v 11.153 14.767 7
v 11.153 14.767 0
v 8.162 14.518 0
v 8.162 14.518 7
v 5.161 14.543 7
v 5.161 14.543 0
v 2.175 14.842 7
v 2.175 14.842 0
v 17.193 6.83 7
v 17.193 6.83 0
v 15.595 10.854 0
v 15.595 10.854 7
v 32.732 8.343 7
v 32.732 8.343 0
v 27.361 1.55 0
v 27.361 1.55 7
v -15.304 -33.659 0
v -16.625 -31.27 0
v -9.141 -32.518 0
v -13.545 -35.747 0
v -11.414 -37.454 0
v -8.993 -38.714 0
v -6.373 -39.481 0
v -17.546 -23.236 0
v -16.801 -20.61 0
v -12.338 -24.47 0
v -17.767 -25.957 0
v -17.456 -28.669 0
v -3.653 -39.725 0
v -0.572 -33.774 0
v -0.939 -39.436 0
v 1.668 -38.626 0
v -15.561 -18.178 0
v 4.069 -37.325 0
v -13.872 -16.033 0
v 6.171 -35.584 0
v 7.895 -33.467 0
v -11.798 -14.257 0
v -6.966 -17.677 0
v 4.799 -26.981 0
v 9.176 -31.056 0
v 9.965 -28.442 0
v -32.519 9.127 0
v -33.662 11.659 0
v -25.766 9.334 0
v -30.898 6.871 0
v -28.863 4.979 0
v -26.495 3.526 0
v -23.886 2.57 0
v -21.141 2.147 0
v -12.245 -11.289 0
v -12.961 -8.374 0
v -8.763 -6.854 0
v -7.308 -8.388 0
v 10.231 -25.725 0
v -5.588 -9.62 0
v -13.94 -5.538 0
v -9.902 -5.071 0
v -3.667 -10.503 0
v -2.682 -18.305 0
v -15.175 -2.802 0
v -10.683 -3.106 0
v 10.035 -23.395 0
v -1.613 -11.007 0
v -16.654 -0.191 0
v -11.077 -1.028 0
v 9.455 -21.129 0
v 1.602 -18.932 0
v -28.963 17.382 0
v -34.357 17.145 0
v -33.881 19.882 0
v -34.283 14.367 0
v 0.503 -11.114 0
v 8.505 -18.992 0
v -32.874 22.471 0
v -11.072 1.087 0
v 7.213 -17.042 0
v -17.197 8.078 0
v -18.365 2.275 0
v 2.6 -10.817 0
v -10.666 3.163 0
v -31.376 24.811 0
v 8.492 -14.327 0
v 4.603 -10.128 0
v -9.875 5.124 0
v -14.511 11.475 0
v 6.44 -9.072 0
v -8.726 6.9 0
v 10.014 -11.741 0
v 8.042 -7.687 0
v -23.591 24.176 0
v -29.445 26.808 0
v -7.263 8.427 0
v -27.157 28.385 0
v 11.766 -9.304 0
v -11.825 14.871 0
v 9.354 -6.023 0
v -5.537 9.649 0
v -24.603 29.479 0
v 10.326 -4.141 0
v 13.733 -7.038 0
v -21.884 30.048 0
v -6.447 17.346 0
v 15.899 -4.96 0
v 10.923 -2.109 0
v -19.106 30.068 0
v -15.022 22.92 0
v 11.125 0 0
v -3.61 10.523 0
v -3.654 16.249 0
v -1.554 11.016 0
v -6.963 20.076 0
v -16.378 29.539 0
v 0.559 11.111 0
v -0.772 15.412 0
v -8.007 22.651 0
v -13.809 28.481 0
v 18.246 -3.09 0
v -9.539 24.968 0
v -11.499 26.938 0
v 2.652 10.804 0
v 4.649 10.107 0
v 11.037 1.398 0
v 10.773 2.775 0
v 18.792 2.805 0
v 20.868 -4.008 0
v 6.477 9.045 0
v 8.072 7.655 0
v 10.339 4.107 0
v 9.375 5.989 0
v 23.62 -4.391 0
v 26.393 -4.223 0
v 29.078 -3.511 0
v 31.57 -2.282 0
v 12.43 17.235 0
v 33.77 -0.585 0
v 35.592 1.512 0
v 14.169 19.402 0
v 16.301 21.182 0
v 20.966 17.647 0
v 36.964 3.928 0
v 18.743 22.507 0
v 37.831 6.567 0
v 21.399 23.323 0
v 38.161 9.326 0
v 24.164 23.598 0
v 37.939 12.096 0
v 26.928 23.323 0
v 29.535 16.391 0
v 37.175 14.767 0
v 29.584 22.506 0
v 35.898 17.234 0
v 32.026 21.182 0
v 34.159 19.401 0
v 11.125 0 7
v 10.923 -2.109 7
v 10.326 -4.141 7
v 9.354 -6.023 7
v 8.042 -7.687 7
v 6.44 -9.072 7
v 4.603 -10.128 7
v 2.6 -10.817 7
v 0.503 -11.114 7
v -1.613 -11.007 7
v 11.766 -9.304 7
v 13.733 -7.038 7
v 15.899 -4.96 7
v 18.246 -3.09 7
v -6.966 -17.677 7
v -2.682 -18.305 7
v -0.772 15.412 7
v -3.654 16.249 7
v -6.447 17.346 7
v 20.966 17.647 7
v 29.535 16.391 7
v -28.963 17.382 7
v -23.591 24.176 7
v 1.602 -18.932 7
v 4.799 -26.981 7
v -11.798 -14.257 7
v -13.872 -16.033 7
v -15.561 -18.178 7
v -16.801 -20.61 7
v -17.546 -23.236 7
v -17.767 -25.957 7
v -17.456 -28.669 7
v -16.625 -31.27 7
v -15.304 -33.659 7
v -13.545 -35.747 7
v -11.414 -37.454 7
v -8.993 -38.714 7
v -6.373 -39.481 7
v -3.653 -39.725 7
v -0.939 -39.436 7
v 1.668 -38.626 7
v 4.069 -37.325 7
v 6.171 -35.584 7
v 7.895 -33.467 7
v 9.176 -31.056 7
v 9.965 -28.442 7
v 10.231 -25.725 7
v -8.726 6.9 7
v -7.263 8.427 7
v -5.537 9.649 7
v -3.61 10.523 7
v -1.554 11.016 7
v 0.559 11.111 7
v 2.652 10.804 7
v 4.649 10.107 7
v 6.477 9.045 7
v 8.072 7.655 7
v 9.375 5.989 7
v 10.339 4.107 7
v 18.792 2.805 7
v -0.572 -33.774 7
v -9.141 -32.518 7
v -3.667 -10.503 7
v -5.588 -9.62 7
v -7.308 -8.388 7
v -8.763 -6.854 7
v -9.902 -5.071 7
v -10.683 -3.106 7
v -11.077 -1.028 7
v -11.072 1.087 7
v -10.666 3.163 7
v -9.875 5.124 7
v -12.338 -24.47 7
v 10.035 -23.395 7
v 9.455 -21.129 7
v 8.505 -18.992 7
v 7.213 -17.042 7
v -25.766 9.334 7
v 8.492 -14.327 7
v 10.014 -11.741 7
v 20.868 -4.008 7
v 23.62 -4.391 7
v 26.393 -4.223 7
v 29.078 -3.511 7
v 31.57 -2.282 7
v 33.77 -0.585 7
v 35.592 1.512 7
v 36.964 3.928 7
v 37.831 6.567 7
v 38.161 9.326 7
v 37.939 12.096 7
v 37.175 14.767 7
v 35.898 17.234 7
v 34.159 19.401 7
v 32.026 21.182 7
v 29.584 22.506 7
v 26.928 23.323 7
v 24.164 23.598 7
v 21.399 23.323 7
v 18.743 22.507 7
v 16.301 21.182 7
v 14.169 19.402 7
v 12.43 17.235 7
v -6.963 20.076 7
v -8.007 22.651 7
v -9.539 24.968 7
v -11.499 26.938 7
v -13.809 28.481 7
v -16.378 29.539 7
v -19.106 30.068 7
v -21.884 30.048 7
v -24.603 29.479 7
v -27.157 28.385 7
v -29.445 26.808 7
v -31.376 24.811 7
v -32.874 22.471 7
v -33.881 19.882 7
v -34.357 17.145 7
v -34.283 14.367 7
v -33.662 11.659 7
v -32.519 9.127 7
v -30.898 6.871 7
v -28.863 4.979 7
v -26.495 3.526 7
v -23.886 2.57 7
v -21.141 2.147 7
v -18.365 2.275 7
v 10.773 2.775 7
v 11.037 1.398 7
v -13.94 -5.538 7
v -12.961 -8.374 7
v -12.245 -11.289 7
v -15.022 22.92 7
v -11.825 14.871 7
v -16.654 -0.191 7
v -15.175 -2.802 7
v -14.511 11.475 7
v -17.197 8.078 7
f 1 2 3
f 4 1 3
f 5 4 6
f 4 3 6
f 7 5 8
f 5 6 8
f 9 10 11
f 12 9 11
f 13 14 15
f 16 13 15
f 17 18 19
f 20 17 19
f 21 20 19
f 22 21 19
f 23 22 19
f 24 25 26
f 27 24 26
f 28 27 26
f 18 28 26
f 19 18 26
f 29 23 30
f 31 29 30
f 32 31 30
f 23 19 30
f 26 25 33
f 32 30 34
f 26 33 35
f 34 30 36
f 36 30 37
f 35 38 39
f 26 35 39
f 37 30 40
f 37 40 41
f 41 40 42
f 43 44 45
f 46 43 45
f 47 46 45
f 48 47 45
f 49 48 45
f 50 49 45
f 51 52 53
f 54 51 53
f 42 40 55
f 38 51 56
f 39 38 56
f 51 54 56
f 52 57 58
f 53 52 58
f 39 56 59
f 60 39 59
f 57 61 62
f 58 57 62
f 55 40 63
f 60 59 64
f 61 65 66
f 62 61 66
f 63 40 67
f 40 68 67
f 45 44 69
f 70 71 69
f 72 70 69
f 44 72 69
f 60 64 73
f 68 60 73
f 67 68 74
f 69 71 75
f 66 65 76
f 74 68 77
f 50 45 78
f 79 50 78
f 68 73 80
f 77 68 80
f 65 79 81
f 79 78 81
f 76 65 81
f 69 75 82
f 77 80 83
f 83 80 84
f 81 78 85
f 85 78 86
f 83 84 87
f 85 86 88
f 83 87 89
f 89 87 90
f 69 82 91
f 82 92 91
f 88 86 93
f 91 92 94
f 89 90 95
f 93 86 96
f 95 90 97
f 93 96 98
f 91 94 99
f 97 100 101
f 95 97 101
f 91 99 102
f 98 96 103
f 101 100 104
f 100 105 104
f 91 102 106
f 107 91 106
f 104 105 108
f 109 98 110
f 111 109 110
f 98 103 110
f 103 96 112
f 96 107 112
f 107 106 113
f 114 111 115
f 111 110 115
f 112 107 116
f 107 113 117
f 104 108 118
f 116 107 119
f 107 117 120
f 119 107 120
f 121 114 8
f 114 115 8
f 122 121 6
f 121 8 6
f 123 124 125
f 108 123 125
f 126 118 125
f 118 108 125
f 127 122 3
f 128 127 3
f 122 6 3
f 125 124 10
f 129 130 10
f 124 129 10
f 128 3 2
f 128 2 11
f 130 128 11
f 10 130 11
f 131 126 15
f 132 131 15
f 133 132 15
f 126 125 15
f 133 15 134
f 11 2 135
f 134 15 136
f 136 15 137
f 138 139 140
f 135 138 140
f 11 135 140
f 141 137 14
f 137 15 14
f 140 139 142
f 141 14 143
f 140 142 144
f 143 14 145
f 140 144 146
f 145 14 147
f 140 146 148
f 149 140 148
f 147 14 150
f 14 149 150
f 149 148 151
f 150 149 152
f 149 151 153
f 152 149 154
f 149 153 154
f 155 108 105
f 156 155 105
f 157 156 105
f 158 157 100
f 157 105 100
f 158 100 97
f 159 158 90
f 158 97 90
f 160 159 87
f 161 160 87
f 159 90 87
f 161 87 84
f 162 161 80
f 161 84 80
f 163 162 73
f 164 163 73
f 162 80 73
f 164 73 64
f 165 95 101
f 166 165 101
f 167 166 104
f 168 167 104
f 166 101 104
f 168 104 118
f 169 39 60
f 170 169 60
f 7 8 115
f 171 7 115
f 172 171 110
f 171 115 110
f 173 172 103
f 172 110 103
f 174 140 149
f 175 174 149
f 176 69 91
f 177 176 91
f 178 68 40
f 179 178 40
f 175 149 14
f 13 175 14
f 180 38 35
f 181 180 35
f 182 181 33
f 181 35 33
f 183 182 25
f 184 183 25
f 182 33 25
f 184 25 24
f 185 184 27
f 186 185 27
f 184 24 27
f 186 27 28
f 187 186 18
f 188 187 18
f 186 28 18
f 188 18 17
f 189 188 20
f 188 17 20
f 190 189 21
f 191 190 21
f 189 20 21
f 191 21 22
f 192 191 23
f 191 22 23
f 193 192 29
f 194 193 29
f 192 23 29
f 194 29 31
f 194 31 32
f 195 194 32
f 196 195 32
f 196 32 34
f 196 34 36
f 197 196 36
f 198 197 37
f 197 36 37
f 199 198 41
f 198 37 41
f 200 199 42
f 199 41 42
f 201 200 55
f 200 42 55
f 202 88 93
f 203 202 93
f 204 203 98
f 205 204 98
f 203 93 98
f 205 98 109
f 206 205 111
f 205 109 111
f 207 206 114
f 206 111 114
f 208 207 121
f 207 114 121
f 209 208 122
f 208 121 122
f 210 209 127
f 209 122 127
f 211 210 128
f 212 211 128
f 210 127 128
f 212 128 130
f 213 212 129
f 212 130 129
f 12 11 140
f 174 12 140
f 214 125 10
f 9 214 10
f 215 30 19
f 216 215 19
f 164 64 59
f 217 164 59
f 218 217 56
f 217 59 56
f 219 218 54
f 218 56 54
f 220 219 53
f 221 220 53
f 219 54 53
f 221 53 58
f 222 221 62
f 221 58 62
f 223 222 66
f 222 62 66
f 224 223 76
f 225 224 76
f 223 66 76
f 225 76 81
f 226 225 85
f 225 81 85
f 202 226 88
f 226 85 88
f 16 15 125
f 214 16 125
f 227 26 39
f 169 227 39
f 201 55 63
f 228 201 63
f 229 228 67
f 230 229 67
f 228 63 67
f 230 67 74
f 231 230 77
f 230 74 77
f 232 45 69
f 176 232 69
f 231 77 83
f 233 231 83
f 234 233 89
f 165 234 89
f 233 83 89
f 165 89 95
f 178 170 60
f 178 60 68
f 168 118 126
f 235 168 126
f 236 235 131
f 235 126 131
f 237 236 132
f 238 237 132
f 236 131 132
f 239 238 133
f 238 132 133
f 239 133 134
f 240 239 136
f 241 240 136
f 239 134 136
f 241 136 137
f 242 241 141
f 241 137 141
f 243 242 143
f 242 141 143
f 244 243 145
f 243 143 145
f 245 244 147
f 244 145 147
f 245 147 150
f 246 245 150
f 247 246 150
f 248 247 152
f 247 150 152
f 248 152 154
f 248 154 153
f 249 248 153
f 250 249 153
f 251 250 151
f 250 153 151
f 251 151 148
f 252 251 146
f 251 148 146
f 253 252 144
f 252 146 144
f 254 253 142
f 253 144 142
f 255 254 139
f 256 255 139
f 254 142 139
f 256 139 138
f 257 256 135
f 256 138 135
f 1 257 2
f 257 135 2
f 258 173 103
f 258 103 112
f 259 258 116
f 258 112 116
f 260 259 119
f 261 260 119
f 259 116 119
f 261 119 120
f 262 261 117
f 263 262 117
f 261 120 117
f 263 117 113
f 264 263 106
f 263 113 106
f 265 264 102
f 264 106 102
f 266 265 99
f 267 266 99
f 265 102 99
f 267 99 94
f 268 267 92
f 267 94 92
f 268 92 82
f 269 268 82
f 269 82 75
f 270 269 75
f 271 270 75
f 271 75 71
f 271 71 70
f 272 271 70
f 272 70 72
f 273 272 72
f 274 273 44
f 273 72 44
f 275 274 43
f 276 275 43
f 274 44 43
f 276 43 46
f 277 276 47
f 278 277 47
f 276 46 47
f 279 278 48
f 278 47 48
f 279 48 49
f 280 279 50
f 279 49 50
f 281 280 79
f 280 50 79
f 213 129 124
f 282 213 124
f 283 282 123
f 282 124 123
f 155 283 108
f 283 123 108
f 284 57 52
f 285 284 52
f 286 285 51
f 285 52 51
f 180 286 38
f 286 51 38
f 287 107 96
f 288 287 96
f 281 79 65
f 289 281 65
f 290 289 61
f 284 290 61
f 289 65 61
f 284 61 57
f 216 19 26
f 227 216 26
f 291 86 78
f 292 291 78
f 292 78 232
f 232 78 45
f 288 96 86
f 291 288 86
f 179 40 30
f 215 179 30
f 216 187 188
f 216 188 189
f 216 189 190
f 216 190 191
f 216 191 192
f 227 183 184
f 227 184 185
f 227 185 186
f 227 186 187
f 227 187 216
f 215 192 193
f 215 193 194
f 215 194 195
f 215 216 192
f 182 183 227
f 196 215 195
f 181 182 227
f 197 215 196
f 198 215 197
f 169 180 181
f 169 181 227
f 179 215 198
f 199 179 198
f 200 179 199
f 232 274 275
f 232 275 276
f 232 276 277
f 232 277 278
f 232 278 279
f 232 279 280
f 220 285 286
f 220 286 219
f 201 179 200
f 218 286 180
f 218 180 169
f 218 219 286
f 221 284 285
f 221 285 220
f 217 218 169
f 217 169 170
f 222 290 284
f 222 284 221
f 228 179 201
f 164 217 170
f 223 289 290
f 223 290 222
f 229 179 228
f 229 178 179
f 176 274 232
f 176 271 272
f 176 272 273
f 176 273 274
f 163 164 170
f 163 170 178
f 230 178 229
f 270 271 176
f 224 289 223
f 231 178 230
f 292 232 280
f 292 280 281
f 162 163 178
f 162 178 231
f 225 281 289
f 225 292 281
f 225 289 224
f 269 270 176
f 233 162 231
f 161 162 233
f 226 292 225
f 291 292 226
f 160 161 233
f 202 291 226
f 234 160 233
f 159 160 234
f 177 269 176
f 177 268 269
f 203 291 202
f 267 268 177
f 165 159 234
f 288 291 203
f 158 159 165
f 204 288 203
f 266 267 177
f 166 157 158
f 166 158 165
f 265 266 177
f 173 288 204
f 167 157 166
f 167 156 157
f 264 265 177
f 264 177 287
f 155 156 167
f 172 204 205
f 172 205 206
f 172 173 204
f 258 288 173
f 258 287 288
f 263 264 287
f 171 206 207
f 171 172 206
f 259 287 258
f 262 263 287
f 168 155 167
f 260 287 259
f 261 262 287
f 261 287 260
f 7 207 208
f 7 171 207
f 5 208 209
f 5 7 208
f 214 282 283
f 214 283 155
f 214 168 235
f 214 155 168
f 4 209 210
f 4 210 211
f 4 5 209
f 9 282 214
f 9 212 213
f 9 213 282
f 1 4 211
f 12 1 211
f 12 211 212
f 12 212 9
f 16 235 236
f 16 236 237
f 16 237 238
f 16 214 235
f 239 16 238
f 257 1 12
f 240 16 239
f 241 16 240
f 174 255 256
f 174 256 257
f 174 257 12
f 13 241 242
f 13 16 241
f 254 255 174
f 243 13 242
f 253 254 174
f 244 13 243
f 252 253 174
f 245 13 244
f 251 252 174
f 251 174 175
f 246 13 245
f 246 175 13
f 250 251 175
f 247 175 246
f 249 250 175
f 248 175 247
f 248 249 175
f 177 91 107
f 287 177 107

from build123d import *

# Parameters (mm, degrees)
F1_DEPTH = 7


with BuildPart() as f1:
    # F0 (on Top) → F1 (new body)
    with BuildSketch(Plane.XY):
        with BuildLine():
            ThreePointArc((2.1746022478, 14.8415331103), (6.4977862425, 13.5195700356), (10.2307544738, 10.9695789753))
            ThreePointArc((10.2307544738, 10.9695789753), (10.5585141702, 12.900767483), (11.1526052364, 14.7673074037))
            ThreePointArc((11.1526052364, 14.7673074037), (6.6610534474, 14.4959482424), (2.1746022478, 14.8415331103))
        make_face()
        with BuildLine():
            ThreePointArc((-6.6537135081, 13.4435150371), (-2.3461080653, 14.8153898682), (2.1746022478, 14.8415331103))
            ThreePointArc((2.1746022478, 14.8415331103), (-2.222405254, 15.7975651559), (-6.4473076734, 17.3460714654))
            ThreePointArc((-6.4473076734, 17.3460714654), (-6.4074297998, 16.7371058402), (-6.3941287506, 16.1269808862))
            ThreePointArc((-6.3941287506, 16.1269808862), (-6.4591760525, 14.7789848542), (-6.6537135081, 13.4435150371))
        make_face()
        with BuildLine():
            ThreePointArc((-14.6153112984, 3.3753037866), (-16.4516494537, 2.6935577561), (-18.3651659754, 2.2747857513))
            ThreePointArc((-18.3651659754, 2.2747857513), (-15.8843861596, -1.4793326091), (-13.9404458375, -5.5375057427))
            ThreePointArc((-13.9404458375, -5.5375057427), (-14.9571842212, -1.1325370512), (-14.6153112984, 3.3753037866))
        make_face()
        with BuildLine():
            ThreePointArc((-11.7984847082, -14.2565679638), (-10.1191795776, -13.2481782826), (-8.3155687842, -12.484042446))
            ThreePointArc((-8.3155687842, -12.484042446), (-11.6574499679, -9.4394841091), (-13.9404458375, -5.5375057427))
            ThreePointArc((-13.9404458375, -5.5375057427), (-12.5698901189, -9.8234419736), (-11.7984847082, -14.2565679638))
        make_face()
        with BuildLine():
            ThreePointArc((7.2125607389, -17.042093155), (9.2233325136, -13.0166159499), (11.7658431097, -9.3040279405))
            ThreePointArc((11.7658431097, -9.3040279405), (8.4593976642, -12.3870331863), (4.3845568245, -14.3448827619))
            ThreePointArc((4.3845568245, -14.3448827619), (5.8931352835, -15.5943252391), (7.2125607389, -17.042093155))
        make_face()
        with BuildLine():
            ThreePointArc((18.2457923815, -3.0895035015), (16.5328487354, -2.1393774383), (14.9692822923, -0.959472591))
            ThreePointArc((14.9692822923, -0.959472591), (14.0035578894, -5.375906104), (11.7658431097, -9.3040279405))
            ThreePointArc((11.7658431097, -9.3040279405), (14.792295096, -5.9741234333), (18.2457923815, -3.0895035015))
        make_face()
        with BuildLine():
            ThreePointArc((-15.0224460068, 22.9199938039), (-10.9533439645, 19.7969343363), (-6.4473076734, 17.3460714654))
            ThreePointArc((-6.4473076734, 17.3460714654), (-31.3755826932, 24.8107398249), (-18.3651659754, 2.2747857513))
            ThreePointArc((-18.3651659754, 2.2747857513), (-21.7888075854, 6.0944414943), (-25.7658114944, 9.3339679685))
            Line((-25.7658114944, 9.3339679685), (-28.9628918775, 17.3824881445))
            Line((-28.9628918775, 17.3824881445), (-23.5912091337, 24.1755010623))
            Line((-23.5912091337, 24.1755010623), (-15.0224460068, 22.9199938039))
        make_face()
        with BuildLine():
            ThreePointArc((27.3605198922, 1.5498229669), (22.6213200346, -0.4125930385), (18.2457923815, -3.0895035015))
            ThreePointArc((18.2457923815, -3.0895035015), (31.6851726942, -2.2094309865), (38.1634395091, 9.598343143))
            ThreePointArc((38.1634395091, 9.598343143), (26.7948193926, 23.348828222), (11.1526052364, 14.7673074037))
            ThreePointArc((11.1526052364, 14.7673074037), (16.1723449486, 15.82244014), (20.966359126, 17.646863319))
            Line((20.966359126, 17.646863319), (29.5351222529, 16.3913560607))
            Line((29.5351222529, 16.3913560607), (32.732202636, 8.3428358846))
            Line((32.732202636, 8.3428358846), (27.3605198922, 1.5498229669))
        make_face()
        with BuildLine():
            ThreePointArc((10.2306892415, -25.7253240292), (9.454648576, -21.1289233158), (7.2125607389, -17.042093155))
            ThreePointArc((7.2125607389, -17.042093155), (5.6164626368, -21.9168816343), (4.7994523683, -26.9808312875))
            Line((4.7994523683, -26.9808312875), (-0.5722303754, -33.7738442052))
            Line((-0.5722303754, -33.7738442052), (-9.1409935023, -32.5183369469))
            Line((-9.1409935023, -32.5183369469), (-12.3380738854, -24.4698167708))
            ThreePointArc((-12.3380738854, -24.4698167708), (-11.6679760701, -19.3843412978), (-11.7984847082, -14.2565679638))
            ThreePointArc((-11.7984847082, -14.2565679638), (-10.2342765243, -38.1432231127), (10.2306892415, -25.7253240292))
        make_face()
        with BuildLine():
            ThreePointArc((13.9404458706, 5.5375056594), (14.7327303657, 2.818981371), (15, 0))
            ThreePointArc((15, 0), (14.9923186063, -0.4799820909), (14.9692822923, -0.959472591))
            ThreePointArc((14.9692822923, -0.959472591), (16.5328487354, -2.1393774383), (18.2457923815, -3.0895035015))
            ThreePointArc((18.2457923815, -3.0895035015), (22.6213200346, -0.4125930385), (27.3605198922, 1.5498229669))
            Line((27.3605198922, 1.5498229669), (18.7917567653, 2.8053302252))
            Line((18.7917567653, 2.8053302252), (17.1932165738, 6.8295903133))
            Line((17.1932165738, 6.8295903133), (13.9404458706, 5.5375056594))
        make_face()
        with BuildLine():
            ThreePointArc((10.2307544738, 10.9695789753), (12.3870330043, 8.4593979307), (13.9404458706, 5.5375056594))
            Line((13.9404458706, 5.5375056594), (17.1932165738, 6.8295903133))
            Line((17.1932165738, 6.8295903133), (15.5946763822, 10.8538504013))
            Line((15.5946763822, 10.8538504013), (20.966359126, 17.646863319))
            ThreePointArc((20.966359126, 17.646863319), (16.1723449486, 15.82244014), (11.1526052364, 14.7673074037))
            ThreePointArc((11.1526052364, 14.7673074037), (10.5585141702, 12.900767483), (10.2307544738, 10.9695789753))
        make_face()
        with BuildLine():
            ThreePointArc((-11.76584351, 9.3040274344), (-9.4394840743, 11.6574499961), (-6.6537135081, 13.4435150371))
            ThreePointArc((-6.6537135081, 13.4435150371), (-6.4591760525, 14.7789848542), (-6.3941287506, 16.1269808862))
            ThreePointArc((-6.3941287506, 16.1269808862), (-6.4074297998, 16.7371058402), (-6.4473076734, 17.3460714654))
            ThreePointArc((-6.4473076734, 17.3460714654), (-10.9533439645, 19.7969343363), (-15.0224460068, 22.9199938039))
            Line((-15.0224460068, 22.9199938039), (-11.8253656237, 14.8714736279))
            Line((-11.8253656237, 14.8714736279), (-14.5112069956, 11.474967169))
            Line((-14.5112069956, 11.474967169), (-11.76584351, 9.3040274344))
        make_face()
        with BuildLine():
            ThreePointArc((-14.6153112984, 3.3753037866), (-13.5195700109, 6.4977862939), (-11.76584351, 9.3040274344))
            Line((-11.76584351, 9.3040274344), (-14.5112069956, 11.474967169))
            Line((-14.5112069956, 11.474967169), (-17.1970483675, 8.0784607102))
            Line((-17.1970483675, 8.0784607102), (-25.7658114944, 9.3339679685))
            ThreePointArc((-25.7658114944, 9.3339679685), (-21.7888075854, 6.0944414943), (-18.3651659754, 2.2747857513))
            ThreePointArc((-18.3651659754, 2.2747857513), (-16.4516494537, 2.6935577561), (-14.6153112984, 3.3753037866))
        make_face()
        with BuildLine():
            Line((-2.6820095782, -18.3045574823), (-2.1746023607, -14.8415330938))
            ThreePointArc((-2.1746023607, -14.8415330938), (-5.3759058028, -14.003558005), (-8.3155687842, -12.484042446))
            ThreePointArc((-8.3155687842, -12.484042446), (-10.1191795776, -13.2481782826), (-11.7984847082, -14.2565679638))
            ThreePointArc((-11.7984847082, -14.2565679638), (-11.6679760701, -19.3843412978), (-12.3380738854, -24.4698167708))
            Line((-12.3380738854, -24.4698167708), (-6.9663911416, -17.6768038531))
            Line((-6.9663911416, -17.6768038531), (-2.6820095782, -18.3045574823))
        make_face()
        with BuildLine():
            ThreePointArc((7.2125607389, -17.042093155), (5.8931352835, -15.5943252391), (4.3845568245, -14.3448827619))
            ThreePointArc((4.3845568245, -14.3448827619), (1.1325370065, -14.9571842246), (-2.1746023607, -14.8415330938))
            Line((-2.1746023607, -14.8415330938), (-2.6820095782, -18.3045574823))
            Line((-2.6820095782, -18.3045574823), (1.6023719853, -18.9323111115))
            Line((1.6023719853, -18.9323111115), (4.7994523683, -26.9808312875))
            ThreePointArc((4.7994523683, -26.9808312875), (5.6164626368, -21.9168816343), (7.2125607389, -17.042093155))
        make_face()
        with BuildLine():
            ThreePointArc((11.1523566965, 4.4300045275), (10.3004252283, 7.6446709467), (10.2307544738, 10.9695789753))
            ThreePointArc((10.2307544738, 10.9695789753), (6.4977862425, 13.5195700356), (2.1746022478, 14.8415331103))
            ThreePointArc((2.1746022478, 14.8415331103), (-2.3461080653, 14.8153898682), (-6.6537135081, 13.4435150371))
            ThreePointArc((-6.6537135081, 13.4435150371), (-7.674318088, 10.2783556881), (-9.412674808, 7.4432219475))
            Line((-9.412674808, 7.4432219475), (-8.7263339365, 6.9004870138))
            ThreePointArc((-8.7263339365, 6.9004870138), (1.6128300842, 11.0074703779), (10.3391640207, 4.1069833641))
            Line((10.3391640207, 4.1069833641), (11.1523566965, 4.4300045275))
        make_face()
        with BuildLine():
            ThreePointArc((11.7658431097, -9.3040279405), (14.0035578894, -5.375906104), (14.9692822923, -0.959472591))
            ThreePointArc((14.9692822923, -0.959472591), (12.738476179, 1.5069765769), (11.1523566965, 4.4300045275))
            Line((11.1523566965, 4.4300045275), (10.3391640207, 4.1069833641))
            ThreePointArc((10.3391640207, 4.1069833641), (10.9267750213, 2.0907445168), (11.125, 0))
            ThreePointArc((11.125, 0), (7.274025375, -8.4174924914), (-1.6128300842, -11.0074703779))
            Line((-1.6128300842, -11.0074703779), (-1.7396818885, -11.873226475))
            ThreePointArc((-1.7396818885, -11.873226475), (1.4702666292, -12.7427653908), (4.3845568245, -14.3448827619))
            ThreePointArc((4.3845568245, -14.3448827619), (8.4593976642, -12.3870331863), (11.7658431097, -9.3040279405))
        make_face()
        with BuildLine():
            ThreePointArc((-9.412674808, 7.4432219475), (-7.674318088, 10.2783556881), (-6.6537135081, 13.4435150371))
            ThreePointArc((-6.6537135081, 13.4435150371), (-9.4394840743, 11.6574499961), (-11.76584351, 9.3040274344))
            Line((-11.76584351, 9.3040274344), (-9.412674808, 7.4432219475))
        make_face()
        with BuildLine():
            Line((-9.412674808, 7.4432219475), (-11.76584351, 9.3040274344))
            ThreePointArc((-11.76584351, 9.3040274344), (-13.5195700109, 6.4977862939), (-14.6153112984, 3.3753037866))
            ThreePointArc((-14.6153112984, 3.3753037866), (-11.7706918576, 5.0980944442), (-9.412674808, 7.4432219475))
        make_face()
        with BuildLine():
            ThreePointArc((14.9692822923, -0.959472591), (14.9923186063, -0.4799820909), (15, 0))
            ThreePointArc((15, 0), (14.7327303657, 2.818981371), (13.9404458706, 5.5375056594))
            Line((13.9404458706, 5.5375056594), (11.1523566965, 4.4300045275))
            ThreePointArc((11.1523566965, 4.4300045275), (12.738476179, 1.5069765769), (14.9692822923, -0.959472591))
        make_face()
        with BuildLine():
            ThreePointArc((-1.6128300842, -11.0074703779), (-10.3391640207, -4.1069833641), (-8.7263339365, 6.9004870138))
            Line((-8.7263339365, 6.9004870138), (-9.412674808, 7.4432219475))
            ThreePointArc((-9.412674808, 7.4432219475), (-11.7706918576, 5.0980944442), (-14.6153112984, 3.3753037866))
            ThreePointArc((-14.6153112984, 3.3753037866), (-14.9571842212, -1.1325370512), (-13.9404458375, -5.5375057427))
            ThreePointArc((-13.9404458375, -5.5375057427), (-11.6574499679, -9.4394841091), (-8.3155687842, -12.484042446))
            ThreePointArc((-8.3155687842, -12.484042446), (-5.064158091, -11.785332265), (-1.7396818885, -11.873226475))
            Line((-1.7396818885, -11.873226475), (-1.6128300842, -11.0074703779))
        make_face()
        with BuildLine():
            ThreePointArc((-8.3155687842, -12.484042446), (-5.3759058028, -14.003558005), (-2.1746023607, -14.8415330938))
            Line((-2.1746023607, -14.8415330938), (-1.7396818885, -11.873226475))
            ThreePointArc((-1.7396818885, -11.873226475), (-5.064158091, -11.785332265), (-8.3155687842, -12.484042446))
        make_face()
        with BuildLine():
            ThreePointArc((-2.1746023607, -14.8415330938), (1.1325370065, -14.9571842246), (4.3845568245, -14.3448827619))
            ThreePointArc((4.3845568245, -14.3448827619), (1.4702666292, -12.7427653908), (-1.7396818885, -11.873226475))
            Line((-1.7396818885, -11.873226475), (-2.1746023607, -14.8415330938))
        make_face()
        with BuildLine():
            Line((11.1523566965, 4.4300045275), (13.9404458706, 5.5375056594))
            ThreePointArc((13.9404458706, 5.5375056594), (12.3870330043, 8.4593979307), (10.2307544738, 10.9695789753))
            ThreePointArc((10.2307544738, 10.9695789753), (10.3004252283, 7.6446709467), (11.1523566965, 4.4300045275))
        make_face()
    extrude(amount=F1_DEPTH)


solid = f1.part
